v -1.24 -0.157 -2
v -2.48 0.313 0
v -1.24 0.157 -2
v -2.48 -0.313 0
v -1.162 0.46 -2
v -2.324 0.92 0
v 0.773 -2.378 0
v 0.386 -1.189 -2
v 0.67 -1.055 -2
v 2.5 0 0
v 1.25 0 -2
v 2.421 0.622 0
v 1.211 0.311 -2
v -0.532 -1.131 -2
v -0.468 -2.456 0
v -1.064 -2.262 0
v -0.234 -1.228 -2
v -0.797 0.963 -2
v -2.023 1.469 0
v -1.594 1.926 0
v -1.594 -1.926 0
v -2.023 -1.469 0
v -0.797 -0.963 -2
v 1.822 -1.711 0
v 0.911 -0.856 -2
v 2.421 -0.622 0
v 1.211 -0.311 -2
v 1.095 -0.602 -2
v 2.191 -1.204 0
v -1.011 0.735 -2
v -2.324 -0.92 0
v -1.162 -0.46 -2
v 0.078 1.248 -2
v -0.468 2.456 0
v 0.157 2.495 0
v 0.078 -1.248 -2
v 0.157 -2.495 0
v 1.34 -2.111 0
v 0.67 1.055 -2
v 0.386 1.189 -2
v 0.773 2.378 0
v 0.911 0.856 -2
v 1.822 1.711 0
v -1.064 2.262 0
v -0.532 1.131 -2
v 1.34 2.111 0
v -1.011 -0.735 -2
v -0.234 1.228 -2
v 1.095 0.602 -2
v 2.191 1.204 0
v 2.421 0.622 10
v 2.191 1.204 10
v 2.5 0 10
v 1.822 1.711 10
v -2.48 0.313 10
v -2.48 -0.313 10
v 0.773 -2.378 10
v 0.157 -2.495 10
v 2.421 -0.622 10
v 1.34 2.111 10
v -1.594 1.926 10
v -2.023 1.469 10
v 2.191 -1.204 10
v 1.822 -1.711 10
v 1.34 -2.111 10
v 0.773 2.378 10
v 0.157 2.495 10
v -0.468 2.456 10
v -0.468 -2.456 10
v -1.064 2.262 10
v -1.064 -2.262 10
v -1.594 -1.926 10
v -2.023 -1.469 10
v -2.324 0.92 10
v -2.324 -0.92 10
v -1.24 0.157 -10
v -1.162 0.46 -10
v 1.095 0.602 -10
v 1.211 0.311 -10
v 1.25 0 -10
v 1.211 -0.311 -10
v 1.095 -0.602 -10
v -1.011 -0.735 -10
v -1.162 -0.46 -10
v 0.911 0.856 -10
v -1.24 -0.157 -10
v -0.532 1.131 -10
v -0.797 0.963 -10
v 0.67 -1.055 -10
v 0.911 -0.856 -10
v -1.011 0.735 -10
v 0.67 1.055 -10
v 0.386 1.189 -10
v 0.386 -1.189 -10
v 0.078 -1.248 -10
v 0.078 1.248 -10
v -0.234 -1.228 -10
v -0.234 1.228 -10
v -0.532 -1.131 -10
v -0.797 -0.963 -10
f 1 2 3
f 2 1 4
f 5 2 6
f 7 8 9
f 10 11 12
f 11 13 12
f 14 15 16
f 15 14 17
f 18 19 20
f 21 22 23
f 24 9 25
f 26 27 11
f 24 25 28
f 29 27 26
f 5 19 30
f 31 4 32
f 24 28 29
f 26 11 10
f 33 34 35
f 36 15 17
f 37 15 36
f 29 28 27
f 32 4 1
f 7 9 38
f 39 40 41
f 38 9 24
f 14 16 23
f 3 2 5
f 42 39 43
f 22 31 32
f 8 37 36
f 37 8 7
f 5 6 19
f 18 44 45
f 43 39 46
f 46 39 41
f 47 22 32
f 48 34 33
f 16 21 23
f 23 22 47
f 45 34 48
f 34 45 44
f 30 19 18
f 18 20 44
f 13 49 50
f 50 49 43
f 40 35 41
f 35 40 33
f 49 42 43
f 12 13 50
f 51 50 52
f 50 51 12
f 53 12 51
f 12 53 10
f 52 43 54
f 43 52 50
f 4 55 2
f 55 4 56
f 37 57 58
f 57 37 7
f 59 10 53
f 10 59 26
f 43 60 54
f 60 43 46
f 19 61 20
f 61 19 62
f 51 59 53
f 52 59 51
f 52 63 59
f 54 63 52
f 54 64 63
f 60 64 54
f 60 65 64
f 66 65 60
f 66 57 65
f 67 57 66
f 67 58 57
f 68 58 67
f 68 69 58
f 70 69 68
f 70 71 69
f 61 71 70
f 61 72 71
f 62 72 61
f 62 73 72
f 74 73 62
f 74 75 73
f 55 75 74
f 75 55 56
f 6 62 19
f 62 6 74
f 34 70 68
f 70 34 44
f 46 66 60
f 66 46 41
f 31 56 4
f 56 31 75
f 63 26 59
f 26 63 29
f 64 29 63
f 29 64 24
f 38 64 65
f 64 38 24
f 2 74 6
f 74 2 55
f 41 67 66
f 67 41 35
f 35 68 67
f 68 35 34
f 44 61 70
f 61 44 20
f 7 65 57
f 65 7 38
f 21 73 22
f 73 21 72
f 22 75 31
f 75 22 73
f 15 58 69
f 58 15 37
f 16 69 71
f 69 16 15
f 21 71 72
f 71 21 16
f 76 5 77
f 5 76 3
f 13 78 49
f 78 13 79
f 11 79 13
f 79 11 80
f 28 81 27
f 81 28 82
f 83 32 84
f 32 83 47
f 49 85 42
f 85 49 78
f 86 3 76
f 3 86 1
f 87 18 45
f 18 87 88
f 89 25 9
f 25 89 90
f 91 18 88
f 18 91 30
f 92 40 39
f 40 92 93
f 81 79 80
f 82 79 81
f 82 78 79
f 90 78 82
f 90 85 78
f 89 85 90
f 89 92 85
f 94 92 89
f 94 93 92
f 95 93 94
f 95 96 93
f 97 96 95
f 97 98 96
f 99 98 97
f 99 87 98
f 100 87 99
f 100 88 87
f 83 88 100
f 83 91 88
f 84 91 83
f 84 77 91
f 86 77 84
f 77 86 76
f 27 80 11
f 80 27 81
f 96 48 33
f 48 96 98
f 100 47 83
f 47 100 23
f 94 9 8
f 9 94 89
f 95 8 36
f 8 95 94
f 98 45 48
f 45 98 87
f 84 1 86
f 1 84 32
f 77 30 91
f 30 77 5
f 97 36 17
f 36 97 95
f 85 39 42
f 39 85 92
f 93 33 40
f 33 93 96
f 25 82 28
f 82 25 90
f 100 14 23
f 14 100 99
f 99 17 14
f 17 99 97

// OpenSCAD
/*
Countersink depression for tapered screw heads.
*/

module make_countersink(d1=0, d2=0, h=0, outer=10, inner=0, $fn=25){
    /*
    d1 = shaft diameter
    d2 = head diameter
    h = height of taper
    outer = height of head mass
    inner = height of shaft mass, including taper
    */
    default_taper_height = 2;
    d1 = d1 ? d1 : 2.5;
    d2 = d2 ? d2 : 5;
    h = h ? h : default_taper_height;
    inner = (inner ? inner : 10) - default_taper_height;
    
    translate([0, 0, -h/2])
    union(){
        
        // taper
        cylinder(d1=d1, d2=d2, h=h, center=true, $fn=$fn);
    
        // big top
        translate([0, 0, h/2])
        cylinder(d=d2, h=outer, center=false, $fn=$fn);
        
        // lower bottom
        translate([0, 0, -h/2-inner])
        cylinder(d=d1, h=inner, center=false, $fn=$fn);
    }
}

make_countersink(inner=10);

if(0)
color("blue")
translate([0,2,0])
cylinder(d=2.5, h=20, center=true, $fn=100);
